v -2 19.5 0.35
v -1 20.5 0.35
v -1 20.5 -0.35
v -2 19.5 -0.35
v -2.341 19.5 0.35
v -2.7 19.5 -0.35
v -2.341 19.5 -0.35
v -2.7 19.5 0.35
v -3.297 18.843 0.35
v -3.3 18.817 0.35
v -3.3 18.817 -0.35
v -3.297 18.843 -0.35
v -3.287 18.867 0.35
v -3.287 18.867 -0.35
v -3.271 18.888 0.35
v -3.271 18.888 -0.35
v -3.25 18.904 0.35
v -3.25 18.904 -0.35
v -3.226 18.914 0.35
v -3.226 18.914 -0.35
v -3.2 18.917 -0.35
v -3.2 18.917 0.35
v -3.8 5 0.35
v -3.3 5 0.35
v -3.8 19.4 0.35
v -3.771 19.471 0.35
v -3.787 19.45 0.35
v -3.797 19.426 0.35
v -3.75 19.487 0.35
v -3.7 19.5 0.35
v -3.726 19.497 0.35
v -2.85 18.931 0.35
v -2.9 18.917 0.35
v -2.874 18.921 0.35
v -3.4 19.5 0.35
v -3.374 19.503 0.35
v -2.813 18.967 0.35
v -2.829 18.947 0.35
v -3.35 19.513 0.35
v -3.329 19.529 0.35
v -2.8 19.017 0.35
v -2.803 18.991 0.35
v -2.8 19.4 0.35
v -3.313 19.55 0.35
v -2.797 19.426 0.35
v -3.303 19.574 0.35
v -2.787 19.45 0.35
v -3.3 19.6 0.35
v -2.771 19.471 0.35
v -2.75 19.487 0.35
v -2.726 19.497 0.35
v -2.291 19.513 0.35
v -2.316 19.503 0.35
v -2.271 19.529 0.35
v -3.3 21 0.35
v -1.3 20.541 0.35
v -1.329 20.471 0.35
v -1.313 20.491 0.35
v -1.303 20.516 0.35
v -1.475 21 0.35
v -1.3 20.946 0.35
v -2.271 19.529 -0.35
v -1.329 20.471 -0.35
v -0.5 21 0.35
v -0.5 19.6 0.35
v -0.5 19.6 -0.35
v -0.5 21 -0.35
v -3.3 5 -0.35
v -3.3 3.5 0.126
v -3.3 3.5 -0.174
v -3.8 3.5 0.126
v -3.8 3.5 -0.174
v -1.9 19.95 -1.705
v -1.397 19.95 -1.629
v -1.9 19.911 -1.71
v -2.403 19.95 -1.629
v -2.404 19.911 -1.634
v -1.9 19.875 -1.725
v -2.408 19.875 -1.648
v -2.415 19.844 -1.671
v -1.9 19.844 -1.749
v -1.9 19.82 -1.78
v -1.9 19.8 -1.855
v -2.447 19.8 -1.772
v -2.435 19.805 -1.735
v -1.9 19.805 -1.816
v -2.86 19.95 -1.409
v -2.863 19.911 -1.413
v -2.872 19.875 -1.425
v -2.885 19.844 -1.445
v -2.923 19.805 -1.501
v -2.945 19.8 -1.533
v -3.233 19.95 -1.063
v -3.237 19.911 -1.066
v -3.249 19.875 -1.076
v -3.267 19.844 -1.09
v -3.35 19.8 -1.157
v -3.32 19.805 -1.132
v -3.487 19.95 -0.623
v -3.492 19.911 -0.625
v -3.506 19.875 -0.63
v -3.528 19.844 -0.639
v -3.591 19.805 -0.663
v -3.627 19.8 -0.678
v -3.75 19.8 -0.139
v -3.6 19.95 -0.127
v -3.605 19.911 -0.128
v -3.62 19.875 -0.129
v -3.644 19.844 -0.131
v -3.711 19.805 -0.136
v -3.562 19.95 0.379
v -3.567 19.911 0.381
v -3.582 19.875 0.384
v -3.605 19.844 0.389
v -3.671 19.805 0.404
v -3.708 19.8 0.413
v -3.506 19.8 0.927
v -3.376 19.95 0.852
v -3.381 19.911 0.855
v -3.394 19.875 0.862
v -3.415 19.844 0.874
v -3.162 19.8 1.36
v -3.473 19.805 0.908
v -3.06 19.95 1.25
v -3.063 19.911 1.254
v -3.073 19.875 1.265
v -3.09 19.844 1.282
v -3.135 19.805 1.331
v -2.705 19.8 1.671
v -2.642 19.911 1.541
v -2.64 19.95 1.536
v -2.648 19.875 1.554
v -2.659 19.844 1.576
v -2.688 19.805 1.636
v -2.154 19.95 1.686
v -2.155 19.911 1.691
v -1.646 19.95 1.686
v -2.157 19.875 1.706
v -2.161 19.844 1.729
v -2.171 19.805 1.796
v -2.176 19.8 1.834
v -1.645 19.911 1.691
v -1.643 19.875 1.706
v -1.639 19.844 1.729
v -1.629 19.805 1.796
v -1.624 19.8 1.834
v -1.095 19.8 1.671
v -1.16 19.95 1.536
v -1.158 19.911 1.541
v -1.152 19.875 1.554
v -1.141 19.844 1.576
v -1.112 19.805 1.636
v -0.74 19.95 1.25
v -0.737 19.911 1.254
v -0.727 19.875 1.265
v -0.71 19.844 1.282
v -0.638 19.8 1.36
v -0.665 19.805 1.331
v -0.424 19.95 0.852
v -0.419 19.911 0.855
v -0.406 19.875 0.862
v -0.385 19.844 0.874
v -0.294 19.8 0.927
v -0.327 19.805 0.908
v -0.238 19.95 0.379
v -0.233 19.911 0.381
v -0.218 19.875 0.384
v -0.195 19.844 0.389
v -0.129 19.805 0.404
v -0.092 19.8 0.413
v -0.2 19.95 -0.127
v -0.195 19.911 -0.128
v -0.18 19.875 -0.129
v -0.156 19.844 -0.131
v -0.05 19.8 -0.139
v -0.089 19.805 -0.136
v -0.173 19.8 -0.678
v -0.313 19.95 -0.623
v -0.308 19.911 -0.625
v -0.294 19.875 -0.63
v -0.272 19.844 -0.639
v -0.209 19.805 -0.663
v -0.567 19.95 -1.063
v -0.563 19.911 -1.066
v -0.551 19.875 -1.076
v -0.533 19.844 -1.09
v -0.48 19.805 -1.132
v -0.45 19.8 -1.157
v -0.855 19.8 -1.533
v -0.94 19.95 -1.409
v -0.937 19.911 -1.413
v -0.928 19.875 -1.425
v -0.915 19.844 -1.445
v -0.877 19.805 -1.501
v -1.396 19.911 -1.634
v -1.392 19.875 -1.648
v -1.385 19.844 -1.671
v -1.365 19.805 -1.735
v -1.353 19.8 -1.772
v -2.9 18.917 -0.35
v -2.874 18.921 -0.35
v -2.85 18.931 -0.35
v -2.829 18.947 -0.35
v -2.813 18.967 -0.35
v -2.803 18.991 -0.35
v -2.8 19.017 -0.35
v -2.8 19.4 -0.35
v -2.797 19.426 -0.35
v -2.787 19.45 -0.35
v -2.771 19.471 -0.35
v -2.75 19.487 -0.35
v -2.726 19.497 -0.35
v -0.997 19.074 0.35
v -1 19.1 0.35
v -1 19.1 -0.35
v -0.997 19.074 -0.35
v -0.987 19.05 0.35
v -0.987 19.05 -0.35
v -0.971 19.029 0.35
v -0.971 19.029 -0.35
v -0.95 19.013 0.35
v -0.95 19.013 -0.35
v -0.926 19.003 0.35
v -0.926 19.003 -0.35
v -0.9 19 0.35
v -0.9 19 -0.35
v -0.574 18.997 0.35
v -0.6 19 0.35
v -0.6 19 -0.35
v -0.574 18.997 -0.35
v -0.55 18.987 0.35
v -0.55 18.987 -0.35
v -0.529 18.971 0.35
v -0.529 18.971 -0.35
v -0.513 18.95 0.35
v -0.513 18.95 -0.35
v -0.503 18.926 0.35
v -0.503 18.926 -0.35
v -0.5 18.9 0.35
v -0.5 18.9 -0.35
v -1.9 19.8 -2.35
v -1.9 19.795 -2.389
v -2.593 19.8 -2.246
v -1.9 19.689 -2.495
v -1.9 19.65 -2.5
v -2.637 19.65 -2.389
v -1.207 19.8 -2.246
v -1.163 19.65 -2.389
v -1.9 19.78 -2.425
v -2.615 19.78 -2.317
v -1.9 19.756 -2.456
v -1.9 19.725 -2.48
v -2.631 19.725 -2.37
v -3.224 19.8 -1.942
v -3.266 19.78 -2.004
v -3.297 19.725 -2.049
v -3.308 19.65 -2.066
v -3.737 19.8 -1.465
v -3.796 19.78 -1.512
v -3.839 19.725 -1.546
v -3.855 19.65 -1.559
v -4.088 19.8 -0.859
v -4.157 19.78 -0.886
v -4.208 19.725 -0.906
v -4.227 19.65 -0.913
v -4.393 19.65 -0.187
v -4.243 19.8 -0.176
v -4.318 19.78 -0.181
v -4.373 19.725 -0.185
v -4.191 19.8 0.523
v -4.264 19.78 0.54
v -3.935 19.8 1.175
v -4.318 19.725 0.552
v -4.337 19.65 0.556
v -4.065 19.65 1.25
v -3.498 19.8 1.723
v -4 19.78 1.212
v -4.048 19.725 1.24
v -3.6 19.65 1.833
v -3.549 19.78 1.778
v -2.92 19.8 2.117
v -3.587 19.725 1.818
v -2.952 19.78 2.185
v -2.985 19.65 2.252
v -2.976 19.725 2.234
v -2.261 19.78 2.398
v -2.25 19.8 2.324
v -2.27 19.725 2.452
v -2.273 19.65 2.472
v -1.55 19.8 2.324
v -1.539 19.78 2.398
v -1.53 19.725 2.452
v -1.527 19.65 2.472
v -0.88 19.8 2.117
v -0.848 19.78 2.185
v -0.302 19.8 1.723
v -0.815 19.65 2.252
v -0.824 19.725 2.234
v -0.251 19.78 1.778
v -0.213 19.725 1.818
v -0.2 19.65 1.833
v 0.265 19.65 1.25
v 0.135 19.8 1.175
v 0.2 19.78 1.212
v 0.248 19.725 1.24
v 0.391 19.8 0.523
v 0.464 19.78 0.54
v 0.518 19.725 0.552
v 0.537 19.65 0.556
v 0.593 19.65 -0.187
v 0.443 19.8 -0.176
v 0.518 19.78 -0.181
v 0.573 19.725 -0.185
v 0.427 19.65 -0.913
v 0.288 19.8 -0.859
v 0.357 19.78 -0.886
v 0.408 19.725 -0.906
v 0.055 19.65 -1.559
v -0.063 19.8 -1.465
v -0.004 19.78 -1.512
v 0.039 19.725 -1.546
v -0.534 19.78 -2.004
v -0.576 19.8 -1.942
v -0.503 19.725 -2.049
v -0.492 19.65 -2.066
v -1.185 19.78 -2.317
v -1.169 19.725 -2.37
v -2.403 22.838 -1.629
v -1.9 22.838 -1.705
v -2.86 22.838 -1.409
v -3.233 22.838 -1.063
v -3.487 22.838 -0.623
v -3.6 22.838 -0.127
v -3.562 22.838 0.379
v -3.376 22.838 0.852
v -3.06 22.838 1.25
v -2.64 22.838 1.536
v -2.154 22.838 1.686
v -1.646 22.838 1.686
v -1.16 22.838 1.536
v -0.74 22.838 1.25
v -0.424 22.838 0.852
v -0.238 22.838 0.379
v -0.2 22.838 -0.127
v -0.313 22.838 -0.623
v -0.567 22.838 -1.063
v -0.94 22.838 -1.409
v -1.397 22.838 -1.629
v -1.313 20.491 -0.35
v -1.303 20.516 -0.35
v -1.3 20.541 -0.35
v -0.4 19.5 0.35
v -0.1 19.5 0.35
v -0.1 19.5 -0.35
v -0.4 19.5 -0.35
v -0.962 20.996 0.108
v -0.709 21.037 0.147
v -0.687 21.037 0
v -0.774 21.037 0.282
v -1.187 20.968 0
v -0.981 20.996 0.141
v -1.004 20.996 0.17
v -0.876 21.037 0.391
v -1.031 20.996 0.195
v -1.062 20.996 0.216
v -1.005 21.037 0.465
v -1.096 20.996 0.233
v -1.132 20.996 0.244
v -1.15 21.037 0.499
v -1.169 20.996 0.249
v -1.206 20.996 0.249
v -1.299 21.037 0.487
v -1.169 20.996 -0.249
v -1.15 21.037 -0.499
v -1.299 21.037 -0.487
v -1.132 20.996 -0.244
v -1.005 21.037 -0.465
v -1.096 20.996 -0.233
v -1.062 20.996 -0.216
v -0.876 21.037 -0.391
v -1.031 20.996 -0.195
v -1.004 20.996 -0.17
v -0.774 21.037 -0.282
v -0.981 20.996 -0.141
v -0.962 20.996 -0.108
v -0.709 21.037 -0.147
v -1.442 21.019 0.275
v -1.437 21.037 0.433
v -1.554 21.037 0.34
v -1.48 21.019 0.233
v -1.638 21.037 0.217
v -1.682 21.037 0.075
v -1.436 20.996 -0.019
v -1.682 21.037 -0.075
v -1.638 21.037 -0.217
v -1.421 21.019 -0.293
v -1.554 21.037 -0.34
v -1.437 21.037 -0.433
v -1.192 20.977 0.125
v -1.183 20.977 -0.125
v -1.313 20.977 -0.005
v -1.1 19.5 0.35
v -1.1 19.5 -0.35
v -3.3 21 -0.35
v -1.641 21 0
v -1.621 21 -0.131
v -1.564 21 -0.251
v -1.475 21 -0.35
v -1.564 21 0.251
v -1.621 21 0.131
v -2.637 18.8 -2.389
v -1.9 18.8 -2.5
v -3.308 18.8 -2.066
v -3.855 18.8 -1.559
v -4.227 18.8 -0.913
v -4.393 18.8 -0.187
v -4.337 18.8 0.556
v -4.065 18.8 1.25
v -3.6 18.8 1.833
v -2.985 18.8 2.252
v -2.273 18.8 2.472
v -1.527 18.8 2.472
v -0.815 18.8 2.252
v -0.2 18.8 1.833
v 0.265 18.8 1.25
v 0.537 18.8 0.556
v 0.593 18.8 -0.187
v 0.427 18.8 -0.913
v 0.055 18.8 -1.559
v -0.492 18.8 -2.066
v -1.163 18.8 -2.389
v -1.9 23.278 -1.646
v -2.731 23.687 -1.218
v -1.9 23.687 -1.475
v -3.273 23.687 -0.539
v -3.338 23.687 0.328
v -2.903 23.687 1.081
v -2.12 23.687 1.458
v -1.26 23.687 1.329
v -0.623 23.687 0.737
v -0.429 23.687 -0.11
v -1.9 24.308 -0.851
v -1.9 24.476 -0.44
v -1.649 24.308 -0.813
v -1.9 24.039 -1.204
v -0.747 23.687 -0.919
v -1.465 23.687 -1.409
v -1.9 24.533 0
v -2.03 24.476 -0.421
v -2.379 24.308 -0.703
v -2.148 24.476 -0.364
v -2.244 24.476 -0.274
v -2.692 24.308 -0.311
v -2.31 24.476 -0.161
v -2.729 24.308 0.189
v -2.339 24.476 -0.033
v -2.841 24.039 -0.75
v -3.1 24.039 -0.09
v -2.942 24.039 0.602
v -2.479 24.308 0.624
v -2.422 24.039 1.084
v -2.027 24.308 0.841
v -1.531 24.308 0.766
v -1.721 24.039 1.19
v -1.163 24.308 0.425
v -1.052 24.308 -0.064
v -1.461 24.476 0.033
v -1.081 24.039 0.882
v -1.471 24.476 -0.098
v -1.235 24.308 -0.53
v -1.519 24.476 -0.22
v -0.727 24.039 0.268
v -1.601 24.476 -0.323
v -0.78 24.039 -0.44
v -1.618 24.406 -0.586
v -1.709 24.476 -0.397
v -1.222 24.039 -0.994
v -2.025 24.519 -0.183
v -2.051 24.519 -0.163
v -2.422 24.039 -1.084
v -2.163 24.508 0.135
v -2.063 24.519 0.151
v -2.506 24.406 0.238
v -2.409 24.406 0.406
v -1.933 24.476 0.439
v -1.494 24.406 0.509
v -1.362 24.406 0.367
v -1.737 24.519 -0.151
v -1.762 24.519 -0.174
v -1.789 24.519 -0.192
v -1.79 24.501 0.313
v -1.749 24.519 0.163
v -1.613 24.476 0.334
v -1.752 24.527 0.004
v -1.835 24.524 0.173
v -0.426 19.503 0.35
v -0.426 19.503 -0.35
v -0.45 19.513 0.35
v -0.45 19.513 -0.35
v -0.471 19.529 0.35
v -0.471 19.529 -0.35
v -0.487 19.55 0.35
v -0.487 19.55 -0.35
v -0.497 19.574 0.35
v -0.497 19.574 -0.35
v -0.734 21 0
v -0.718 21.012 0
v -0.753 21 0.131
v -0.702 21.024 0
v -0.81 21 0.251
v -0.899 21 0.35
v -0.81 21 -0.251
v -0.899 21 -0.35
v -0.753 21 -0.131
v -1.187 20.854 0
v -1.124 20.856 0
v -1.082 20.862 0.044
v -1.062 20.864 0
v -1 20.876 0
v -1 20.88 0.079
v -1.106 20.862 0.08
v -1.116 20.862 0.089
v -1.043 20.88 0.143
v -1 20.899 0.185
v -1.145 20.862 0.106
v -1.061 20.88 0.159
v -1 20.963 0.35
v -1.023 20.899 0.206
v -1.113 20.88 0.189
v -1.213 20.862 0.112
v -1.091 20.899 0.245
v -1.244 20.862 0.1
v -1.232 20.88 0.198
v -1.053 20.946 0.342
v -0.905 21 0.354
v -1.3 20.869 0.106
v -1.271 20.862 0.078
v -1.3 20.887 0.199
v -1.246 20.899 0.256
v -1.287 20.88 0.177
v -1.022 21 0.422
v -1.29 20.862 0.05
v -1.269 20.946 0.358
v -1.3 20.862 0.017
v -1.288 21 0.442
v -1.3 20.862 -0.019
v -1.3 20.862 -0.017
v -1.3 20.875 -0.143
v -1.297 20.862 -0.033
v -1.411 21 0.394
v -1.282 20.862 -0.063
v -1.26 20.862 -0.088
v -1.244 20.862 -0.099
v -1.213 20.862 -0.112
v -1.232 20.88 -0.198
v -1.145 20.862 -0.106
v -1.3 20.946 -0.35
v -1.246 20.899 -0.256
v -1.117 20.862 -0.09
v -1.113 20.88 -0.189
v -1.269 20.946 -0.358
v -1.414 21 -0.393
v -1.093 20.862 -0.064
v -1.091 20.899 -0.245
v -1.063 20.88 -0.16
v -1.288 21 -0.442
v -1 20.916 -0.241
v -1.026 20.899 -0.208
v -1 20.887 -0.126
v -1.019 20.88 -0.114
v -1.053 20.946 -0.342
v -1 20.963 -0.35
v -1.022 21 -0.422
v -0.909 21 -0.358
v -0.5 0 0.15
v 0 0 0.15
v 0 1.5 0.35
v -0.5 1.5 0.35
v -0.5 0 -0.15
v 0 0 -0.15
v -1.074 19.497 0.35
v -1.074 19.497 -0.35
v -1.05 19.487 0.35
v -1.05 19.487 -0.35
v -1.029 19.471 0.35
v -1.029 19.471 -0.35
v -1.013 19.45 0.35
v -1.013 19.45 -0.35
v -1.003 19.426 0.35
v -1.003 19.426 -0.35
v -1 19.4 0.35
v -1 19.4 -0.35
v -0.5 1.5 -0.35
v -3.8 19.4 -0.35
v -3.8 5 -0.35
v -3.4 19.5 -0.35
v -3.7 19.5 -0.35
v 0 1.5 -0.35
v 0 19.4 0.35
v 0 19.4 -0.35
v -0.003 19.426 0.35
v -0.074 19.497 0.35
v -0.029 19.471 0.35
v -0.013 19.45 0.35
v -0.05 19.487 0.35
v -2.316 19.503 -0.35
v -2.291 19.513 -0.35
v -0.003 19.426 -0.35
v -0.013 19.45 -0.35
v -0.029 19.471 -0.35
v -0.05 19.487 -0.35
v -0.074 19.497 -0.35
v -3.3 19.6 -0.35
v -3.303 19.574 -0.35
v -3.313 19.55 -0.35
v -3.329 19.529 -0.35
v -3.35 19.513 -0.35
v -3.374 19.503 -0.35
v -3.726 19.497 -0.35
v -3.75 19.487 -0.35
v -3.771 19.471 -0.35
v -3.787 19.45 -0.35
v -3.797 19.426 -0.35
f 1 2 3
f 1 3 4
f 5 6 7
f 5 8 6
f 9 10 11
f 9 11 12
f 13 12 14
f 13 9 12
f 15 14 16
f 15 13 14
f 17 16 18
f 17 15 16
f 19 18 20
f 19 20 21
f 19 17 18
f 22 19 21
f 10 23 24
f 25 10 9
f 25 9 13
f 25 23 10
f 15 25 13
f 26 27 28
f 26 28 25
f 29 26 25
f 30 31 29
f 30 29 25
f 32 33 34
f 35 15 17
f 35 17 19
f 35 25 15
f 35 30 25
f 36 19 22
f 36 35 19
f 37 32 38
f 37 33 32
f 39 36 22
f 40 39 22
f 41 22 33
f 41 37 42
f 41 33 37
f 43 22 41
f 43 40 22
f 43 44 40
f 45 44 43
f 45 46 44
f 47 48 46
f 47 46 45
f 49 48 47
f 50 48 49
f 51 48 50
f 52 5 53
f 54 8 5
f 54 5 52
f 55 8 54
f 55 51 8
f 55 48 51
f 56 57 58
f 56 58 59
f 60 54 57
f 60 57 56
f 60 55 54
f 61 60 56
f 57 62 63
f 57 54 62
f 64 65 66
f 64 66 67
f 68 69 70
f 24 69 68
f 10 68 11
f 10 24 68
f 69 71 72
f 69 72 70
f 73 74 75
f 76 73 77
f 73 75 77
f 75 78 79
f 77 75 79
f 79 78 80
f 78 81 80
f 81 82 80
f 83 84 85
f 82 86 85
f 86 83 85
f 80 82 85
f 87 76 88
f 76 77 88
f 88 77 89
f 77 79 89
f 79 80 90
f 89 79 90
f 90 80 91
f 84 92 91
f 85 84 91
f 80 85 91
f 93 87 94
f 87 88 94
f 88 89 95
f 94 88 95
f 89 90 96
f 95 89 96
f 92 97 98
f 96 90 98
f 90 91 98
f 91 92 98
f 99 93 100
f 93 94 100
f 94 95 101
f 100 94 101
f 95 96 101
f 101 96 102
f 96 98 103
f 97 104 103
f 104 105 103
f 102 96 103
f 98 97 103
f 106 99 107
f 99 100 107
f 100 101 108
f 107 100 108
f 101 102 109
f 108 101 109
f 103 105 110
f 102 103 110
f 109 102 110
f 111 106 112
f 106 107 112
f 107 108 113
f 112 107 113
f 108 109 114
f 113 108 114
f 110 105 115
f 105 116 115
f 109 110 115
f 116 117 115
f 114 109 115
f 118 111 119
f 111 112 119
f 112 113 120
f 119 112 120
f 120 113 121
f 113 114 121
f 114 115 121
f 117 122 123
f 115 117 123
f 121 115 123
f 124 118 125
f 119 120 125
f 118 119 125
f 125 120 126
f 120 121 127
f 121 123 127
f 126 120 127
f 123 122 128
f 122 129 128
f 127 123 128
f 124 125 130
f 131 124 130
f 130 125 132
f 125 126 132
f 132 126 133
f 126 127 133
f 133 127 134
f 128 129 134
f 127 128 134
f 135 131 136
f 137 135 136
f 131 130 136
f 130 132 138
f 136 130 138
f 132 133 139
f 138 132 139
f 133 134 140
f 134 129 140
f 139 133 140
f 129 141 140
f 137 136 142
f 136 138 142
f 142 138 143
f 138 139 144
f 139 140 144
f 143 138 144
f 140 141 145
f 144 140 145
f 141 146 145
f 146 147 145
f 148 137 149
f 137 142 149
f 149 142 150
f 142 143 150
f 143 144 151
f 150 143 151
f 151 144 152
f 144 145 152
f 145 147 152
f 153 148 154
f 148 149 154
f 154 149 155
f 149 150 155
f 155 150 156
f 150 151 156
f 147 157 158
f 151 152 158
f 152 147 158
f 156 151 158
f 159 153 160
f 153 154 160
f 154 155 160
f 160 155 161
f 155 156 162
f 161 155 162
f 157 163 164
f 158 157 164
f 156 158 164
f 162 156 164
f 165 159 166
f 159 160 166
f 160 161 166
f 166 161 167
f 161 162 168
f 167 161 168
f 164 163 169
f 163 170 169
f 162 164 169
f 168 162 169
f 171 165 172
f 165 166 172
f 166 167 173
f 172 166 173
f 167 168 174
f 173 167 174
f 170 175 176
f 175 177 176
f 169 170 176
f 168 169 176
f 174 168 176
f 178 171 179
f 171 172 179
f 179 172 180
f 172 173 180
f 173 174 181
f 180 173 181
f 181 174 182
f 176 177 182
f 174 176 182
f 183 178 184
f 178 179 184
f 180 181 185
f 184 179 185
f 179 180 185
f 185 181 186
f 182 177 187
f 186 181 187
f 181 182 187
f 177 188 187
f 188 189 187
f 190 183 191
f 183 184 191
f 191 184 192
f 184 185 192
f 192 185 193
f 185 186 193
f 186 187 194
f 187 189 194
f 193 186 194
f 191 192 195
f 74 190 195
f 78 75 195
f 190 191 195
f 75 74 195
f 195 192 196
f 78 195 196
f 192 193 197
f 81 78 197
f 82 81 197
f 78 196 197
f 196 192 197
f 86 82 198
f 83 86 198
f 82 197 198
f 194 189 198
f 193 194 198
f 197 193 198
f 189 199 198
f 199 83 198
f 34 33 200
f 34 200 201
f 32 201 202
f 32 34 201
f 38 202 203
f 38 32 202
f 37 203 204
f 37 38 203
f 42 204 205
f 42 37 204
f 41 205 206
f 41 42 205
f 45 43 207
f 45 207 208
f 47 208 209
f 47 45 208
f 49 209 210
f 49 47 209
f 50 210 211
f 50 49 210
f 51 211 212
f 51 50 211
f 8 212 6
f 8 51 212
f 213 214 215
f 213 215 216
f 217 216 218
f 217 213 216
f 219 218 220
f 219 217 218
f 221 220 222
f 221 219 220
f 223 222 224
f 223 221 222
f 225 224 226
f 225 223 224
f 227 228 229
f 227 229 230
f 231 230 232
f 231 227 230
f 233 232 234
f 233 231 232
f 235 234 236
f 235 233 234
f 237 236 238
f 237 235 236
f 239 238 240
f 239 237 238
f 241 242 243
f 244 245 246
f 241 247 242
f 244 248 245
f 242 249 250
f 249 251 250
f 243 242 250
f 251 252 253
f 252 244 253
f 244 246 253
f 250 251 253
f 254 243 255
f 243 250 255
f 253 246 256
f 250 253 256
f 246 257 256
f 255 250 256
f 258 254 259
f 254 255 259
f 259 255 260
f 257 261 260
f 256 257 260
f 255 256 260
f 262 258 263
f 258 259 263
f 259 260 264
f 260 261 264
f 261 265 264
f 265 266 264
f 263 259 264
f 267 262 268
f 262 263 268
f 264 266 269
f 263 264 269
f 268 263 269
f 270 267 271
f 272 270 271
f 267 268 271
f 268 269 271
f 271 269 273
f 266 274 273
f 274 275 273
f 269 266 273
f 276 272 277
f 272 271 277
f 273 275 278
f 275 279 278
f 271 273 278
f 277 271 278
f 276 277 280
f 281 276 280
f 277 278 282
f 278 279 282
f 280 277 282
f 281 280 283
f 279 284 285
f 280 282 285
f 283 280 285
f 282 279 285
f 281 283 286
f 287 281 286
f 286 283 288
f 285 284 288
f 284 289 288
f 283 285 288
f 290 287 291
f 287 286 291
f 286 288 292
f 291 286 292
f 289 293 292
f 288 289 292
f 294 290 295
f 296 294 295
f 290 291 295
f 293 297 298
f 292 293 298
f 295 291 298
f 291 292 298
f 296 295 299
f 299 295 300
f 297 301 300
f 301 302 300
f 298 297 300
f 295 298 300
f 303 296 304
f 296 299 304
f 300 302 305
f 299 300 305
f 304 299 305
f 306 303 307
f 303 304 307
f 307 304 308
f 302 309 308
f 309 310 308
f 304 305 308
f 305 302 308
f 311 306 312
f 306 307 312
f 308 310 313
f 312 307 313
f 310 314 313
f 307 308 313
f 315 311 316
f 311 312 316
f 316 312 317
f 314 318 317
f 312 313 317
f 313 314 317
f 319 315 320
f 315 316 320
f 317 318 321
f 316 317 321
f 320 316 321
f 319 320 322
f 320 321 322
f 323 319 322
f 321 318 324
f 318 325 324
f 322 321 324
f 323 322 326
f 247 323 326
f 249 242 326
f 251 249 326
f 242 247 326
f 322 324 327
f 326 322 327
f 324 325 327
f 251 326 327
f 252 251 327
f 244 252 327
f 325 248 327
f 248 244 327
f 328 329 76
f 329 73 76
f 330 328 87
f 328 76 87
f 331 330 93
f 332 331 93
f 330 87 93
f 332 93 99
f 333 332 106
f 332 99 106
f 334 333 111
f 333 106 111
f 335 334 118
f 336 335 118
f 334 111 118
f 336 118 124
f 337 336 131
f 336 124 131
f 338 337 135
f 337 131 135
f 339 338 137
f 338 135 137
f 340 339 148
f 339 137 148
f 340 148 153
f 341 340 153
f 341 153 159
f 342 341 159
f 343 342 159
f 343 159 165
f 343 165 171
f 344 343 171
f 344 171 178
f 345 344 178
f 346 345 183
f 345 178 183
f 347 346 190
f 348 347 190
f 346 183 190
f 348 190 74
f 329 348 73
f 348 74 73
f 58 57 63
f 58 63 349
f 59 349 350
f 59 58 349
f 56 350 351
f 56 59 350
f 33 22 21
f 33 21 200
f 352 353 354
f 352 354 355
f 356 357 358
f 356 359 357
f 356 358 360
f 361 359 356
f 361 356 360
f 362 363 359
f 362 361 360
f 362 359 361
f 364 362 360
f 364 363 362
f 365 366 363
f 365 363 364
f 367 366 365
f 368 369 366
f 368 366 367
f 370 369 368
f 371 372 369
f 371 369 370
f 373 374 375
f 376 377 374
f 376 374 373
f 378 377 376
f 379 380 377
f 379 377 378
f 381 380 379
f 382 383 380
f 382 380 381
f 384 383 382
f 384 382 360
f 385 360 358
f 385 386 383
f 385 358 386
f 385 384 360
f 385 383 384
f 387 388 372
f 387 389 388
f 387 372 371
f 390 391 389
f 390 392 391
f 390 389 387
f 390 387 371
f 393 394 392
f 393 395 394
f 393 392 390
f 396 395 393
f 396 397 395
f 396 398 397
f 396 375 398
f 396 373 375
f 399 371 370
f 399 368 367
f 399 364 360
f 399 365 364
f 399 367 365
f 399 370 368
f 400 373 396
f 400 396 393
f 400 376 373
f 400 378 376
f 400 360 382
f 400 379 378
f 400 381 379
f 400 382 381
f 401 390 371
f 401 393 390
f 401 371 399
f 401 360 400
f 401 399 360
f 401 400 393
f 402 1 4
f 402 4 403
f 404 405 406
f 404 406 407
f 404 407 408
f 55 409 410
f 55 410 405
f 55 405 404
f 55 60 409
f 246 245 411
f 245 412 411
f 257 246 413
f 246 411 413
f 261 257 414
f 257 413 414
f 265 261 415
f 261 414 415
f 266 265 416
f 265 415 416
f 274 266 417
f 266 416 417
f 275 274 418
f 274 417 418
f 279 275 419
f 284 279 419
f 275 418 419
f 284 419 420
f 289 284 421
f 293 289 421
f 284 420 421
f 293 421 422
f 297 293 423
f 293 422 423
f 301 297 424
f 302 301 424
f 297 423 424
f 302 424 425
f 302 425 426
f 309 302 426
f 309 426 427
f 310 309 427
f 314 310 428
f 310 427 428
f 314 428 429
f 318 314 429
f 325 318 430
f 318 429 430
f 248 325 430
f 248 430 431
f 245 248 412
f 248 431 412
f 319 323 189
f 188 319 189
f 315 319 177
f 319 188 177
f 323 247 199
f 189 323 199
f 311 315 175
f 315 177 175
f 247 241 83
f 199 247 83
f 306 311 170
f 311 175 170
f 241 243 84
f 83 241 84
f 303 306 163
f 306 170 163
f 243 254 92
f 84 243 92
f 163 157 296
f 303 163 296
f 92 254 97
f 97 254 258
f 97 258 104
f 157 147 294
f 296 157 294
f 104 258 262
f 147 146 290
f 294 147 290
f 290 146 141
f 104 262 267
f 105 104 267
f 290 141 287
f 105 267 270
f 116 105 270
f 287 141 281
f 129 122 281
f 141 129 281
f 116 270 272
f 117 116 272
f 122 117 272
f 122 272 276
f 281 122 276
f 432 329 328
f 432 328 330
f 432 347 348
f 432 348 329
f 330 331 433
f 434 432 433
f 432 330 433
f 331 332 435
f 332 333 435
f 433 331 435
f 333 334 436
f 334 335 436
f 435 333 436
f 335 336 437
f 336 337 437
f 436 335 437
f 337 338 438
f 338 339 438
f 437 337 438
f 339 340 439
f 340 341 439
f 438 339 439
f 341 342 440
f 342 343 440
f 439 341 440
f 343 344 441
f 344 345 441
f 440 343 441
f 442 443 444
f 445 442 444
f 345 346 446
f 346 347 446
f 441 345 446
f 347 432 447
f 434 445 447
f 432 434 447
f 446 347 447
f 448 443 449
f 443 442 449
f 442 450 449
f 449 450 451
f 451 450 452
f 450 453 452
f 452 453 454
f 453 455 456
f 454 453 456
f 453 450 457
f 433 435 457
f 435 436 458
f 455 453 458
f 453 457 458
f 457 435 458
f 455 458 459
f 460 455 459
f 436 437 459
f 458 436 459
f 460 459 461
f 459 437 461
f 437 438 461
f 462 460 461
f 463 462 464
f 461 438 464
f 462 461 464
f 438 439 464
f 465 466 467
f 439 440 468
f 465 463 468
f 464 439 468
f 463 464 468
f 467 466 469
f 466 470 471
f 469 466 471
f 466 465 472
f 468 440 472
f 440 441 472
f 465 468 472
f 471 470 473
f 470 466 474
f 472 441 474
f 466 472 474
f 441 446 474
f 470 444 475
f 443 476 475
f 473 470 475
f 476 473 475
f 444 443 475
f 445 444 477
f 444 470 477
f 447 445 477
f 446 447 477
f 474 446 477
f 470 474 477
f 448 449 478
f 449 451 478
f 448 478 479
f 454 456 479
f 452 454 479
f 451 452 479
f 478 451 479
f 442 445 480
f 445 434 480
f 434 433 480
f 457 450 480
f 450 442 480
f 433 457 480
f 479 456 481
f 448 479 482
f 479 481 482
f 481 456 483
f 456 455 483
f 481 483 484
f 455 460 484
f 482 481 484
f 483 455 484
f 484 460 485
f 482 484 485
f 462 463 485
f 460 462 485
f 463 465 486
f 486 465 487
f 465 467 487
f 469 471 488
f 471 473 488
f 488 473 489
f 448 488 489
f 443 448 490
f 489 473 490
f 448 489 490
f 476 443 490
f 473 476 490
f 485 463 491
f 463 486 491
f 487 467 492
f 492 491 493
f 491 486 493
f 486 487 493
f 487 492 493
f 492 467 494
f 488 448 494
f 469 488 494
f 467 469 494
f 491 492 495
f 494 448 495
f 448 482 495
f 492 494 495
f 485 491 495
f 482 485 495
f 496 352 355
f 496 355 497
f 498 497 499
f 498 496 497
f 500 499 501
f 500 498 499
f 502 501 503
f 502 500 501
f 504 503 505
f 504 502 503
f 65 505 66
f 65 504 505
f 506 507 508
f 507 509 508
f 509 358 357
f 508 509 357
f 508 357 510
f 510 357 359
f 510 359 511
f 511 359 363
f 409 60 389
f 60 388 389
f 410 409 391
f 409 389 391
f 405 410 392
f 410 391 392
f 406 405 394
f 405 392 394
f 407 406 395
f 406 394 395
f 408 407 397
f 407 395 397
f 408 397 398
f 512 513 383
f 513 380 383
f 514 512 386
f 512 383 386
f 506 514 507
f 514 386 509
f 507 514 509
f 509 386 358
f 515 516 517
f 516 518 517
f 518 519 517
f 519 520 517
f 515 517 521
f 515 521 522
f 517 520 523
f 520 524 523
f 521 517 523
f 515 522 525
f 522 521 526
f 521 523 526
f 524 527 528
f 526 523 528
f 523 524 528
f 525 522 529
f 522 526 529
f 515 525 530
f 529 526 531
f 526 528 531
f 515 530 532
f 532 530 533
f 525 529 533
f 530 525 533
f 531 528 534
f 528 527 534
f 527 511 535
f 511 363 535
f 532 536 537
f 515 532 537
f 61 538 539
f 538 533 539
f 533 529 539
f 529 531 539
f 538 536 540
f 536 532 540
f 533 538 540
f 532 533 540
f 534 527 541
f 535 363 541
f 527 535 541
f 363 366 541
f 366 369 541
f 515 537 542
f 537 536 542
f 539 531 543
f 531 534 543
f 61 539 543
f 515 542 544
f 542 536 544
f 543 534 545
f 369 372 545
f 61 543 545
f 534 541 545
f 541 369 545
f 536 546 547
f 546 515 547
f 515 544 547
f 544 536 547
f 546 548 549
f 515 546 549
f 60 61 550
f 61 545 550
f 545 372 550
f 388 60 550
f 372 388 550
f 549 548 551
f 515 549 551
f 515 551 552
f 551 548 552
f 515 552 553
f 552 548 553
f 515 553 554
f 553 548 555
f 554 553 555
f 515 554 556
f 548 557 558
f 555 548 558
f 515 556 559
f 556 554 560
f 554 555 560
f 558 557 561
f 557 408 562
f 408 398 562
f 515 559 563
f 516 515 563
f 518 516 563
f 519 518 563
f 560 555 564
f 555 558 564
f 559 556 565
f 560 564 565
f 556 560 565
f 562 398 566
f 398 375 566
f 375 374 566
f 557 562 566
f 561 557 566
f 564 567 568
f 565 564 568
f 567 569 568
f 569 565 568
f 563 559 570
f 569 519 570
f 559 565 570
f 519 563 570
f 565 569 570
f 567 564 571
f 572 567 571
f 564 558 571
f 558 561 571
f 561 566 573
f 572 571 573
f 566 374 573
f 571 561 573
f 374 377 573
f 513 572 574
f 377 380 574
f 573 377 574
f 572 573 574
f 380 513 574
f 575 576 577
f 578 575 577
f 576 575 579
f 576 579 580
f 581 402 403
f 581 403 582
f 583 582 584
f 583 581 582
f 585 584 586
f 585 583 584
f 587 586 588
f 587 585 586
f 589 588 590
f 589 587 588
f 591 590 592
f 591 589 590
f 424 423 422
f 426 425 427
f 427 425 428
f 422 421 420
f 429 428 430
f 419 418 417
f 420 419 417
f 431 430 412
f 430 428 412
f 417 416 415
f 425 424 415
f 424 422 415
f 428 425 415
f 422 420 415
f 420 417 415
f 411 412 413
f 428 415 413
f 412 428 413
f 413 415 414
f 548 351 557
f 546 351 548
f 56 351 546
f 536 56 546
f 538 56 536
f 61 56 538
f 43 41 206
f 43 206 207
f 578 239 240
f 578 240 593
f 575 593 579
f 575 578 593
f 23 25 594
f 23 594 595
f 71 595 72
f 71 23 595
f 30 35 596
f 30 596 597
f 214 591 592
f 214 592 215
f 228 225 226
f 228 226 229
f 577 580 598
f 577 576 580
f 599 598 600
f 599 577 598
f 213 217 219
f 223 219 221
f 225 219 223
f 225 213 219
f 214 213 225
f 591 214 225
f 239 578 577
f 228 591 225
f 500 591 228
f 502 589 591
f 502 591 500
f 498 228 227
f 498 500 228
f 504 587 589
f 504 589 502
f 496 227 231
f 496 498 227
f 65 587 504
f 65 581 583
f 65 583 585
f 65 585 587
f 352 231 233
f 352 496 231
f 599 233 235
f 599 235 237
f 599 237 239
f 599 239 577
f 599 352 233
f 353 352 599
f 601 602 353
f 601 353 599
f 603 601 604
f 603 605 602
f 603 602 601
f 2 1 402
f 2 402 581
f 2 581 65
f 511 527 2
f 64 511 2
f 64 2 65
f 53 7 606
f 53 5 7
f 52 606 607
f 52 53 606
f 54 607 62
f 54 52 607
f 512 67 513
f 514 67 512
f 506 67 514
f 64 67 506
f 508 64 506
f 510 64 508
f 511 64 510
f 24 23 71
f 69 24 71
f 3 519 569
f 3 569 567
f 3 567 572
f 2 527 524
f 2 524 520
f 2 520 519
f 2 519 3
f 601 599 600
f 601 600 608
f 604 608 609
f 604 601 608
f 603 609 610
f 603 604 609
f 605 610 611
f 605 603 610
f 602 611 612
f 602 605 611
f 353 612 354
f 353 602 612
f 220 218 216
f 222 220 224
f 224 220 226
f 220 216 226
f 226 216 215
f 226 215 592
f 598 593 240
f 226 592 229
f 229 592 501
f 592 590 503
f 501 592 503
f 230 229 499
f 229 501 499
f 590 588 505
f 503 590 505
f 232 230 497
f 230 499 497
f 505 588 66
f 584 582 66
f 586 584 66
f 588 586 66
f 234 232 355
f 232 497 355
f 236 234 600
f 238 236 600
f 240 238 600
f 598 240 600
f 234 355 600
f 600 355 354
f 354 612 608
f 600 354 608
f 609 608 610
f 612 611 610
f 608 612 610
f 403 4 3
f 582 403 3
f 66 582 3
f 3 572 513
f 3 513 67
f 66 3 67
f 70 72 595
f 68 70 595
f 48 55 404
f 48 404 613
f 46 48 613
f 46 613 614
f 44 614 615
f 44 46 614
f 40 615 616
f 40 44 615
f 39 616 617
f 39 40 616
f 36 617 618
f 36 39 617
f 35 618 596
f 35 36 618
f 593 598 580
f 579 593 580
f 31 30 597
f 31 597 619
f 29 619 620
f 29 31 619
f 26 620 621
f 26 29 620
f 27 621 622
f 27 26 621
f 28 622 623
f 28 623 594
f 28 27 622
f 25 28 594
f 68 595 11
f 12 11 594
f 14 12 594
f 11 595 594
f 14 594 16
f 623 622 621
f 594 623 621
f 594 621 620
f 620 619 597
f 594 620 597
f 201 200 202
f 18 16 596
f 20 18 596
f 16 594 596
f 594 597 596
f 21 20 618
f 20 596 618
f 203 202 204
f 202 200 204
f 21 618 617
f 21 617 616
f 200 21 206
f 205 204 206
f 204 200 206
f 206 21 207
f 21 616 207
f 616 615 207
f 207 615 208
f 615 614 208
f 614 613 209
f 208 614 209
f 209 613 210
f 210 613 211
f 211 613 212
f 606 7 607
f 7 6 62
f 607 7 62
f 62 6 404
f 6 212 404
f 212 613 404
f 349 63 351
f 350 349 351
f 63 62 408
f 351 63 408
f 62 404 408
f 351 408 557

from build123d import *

# Parameters (mm, degrees)
BOSS_EXTRUDE1_DEPTH = 0.35
BOSS_EXTRUDE2_DEPTH = 0.35
CUT_EXTRUDE1_DEPTH  = 0.7
CUT_EXTRUDE2_DEPTH  = 0.7


with BuildPart() as part:
    # Sketch1 → Boss-Extrude1 (new, symmetric)
    with BuildSketch(Plane.XY):
        with BuildLine():
            Line((0, 0), (0, 19.4))
            ThreePointArc((0, 19.4), (-0.029289322, 19.470710678), (-0.1, 19.5))
            Line((-0.1, 19.5), (-0.4, 19.5))
            ThreePointArc((-0.4, 19.5), (-0.470710678, 19.529289322), (-0.5, 19.6))
            Line((-0.5, 19.6), (-0.5, 20.5))
            Line((-0.5, 20.5), (-0.5, 21))
            Line((-0.5, 21), (-1, 21))
            Line((-1, 21), (-1, 20.5))
            Line((-1, 20.5), (-2, 19.5))
            Line((-2, 19.5), (-1.1, 19.5))
            ThreePointArc((-1.1, 19.5), (-1.029289322, 19.470710678), (-1, 19.4))
            Line((-1, 19.4), (-1, 19.1))
            ThreePointArc((-1, 19.1), (-0.970710678, 19.029289322), (-0.9, 19))
            Line((-0.9, 19), (-0.6, 19))
            ThreePointArc((-0.6, 19), (-0.529289322, 18.970710678), (-0.5, 18.9))
            Line((-0.5, 18.9), (-0.5, 0))
            Line((-0.5, 0), (0, 0))
        make_face()
    extrude(amount=BOSS_EXTRUDE1_DEPTH, both=True)


with BuildPart() as body_2:
    # Sketch2 → Boss-Extrude2 (new, symmetric)
    with BuildSketch(Plane.XY):
        with BuildLine():
            Line((-2.270710678, 19.529289322), (-1.329289322, 20.470710678))
            ThreePointArc((-1.329289322, 20.470710678), (-1.307612047, 20.503153013), (-1.3, 20.541421356))
            Line((-1.3, 20.541421356), (-1.3, 21))
            Line((-1.3, 21), (-3.3, 21))
            Line((-3.3, 21), (-3.3, 19.6))
            ThreePointArc((-3.3, 19.6), (-3.329289322, 19.529289322), (-3.4, 19.5))
            Line((-3.4, 19.5), (-3.7, 19.5))
            ThreePointArc((-3.7, 19.5), (-3.770710678, 19.470710678), (-3.8, 19.4))
            Line((-3.8, 19.4), (-3.8, 3.5))
            Line((-3.8, 3.5), (-3.3, 3.5))
            Line((-3.3, 3.5), (-3.3, 18.817329295))
            ThreePointArc((-3.3, 18.817329295), (-3.270710678, 18.888039973), (-3.2, 18.917329295))
            Line((-3.2, 18.917329295), (-2.9, 18.917329295))
            ThreePointArc((-2.9, 18.917329295), (-2.829289322, 18.946618617), (-2.8, 19.017329295))
            Line((-2.8, 19.017329295), (-2.8, 19.4))
            ThreePointArc((-2.8, 19.4), (-2.770710678, 19.470710678), (-2.7, 19.5))
            Line((-2.7, 19.5), (-2.341421356, 19.5))
            ThreePointArc((-2.341421356, 19.5), (-2.303153013, 19.507612047), (-2.270710678, 19.529289322))
        make_face()
    extrude(amount=BOSS_EXTRUDE2_DEPTH, both=True)


with BuildPart() as cut_revolve2_tool:
    # Sketch3 → Cut-Revolve2 (revolve)
    with BuildSketch(Plane.XY):
        with BuildLine():
            Line((-1.187247292, 20.854394701), (-1.187247292, 21.16036165))
            Line((-1.187247292, 21.16036165), (-0.687247292, 21.037131329))
            ThreePointArc((-0.687247292, 21.037131329), (-0.920585717, 20.900173974), (-1.187247292, 20.854394701))
        make_face()
    revolve(axis=Axis((-1.187247292, 20.854394701, 0), (0, 1, 0)))


with BuildPart() as part_1:
    add(part.part)

    # Cut-Revolve2: cut by cut_revolve2_tool
    add(cut_revolve2_tool.part, mode=Mode.SUBTRACT)



with BuildPart() as body_2_1:
    add(body_2.part)

    # Cut-Revolve2: cut by cut_revolve2_tool
    add(cut_revolve2_tool.part, mode=Mode.SUBTRACT)


with BuildPart() as part_2:
    add(part_1.part)

    add(body_2_1.part)  # Revolve2 merges body 2
    # Sketch5 → Revolve2 (revolve)
    with BuildSketch(Plane.XY):
        with BuildLine():
            Line((-1.187247292, 20.967936142), (-1.187247292, 20.854394701))
            ThreePointArc((-1.187247292, 20.854394701), (-0.920585717, 20.900173974), (-0.687247292, 21.037131329))
            add(Edge.make_bspline(
                [(-1.187247292, 20.967936142), (-1.018996559, 20.969146878), (-0.855677822, 21.018217253), (-0.687247292, 21.037131329)],
                knots=[0, 0, 0, 0, 1, 1, 1, 1], degree=3))
        make_face()
    revolve(axis=Axis((-1.187247292, 20.967936142, 0), (0, -1, 0)))

    # Sketch8 → Cut-Extrude1 (cut)
    with BuildSketch(Plane(origin=(0, 0, 0), x_dir=(0, 0, -1), z_dir=(1, 0, 0))):
        Polygon((0.35, 1.5), (0.15, 0), (0.35, 0), align=None)
        Polygon((-0.35, 0), (-0.15, 0), (-0.35, 1.5), align=None)
    extrude(amount=-CUT_EXTRUDE1_DEPTH, mode=Mode.SUBTRACT)

    # Sketch9 → Cut-Extrude2 (cut)
    with BuildSketch(Plane.ZY.offset(3.8)):
        Polygon((-0.35, 3.5), (-0.173947539, 3.5), (-0.35, 5), align=None)
        Polygon((0.35, 5), (0.126052461, 3.5), (0.35, 3.5), align=None)
    extrude(amount=-CUT_EXTRUDE2_DEPTH, mode=Mode.SUBTRACT)


with BuildPart() as body_2_2:
    # Sketch7 → Revolve6 (revolve)
    with BuildSketch(Plane.XY, mode=Mode.PRIVATE) as revolve6_sk:
        with BuildLine():
            Line((-0.195111941, 22.838026568), (-0.195111941, 19.95))
            ThreePointArc((-0.195111941, 19.95), (-0.151177958, 19.843933983), (-0.045111941, 19.8))
            Line((-0.045111941, 19.8), (0.45, 19.8))
            ThreePointArc((0.45, 19.8), (0.556066017, 19.756066017), (0.6, 19.65))
            Line((0.6, 19.65), (0.6, 18.8))
            Line((0.6, 18.8), (-1.9, 18.8))
            Line((-1.9, 18.8), (-1.9, 24.533124413))
            ThreePointArc((-1.9, 24.533124413), (-0.696489712, 24.038669369), (-0.195111941, 22.838026568))
        make_face()
    revolve(revolve6_sk.sketch.rotate(Axis((-1.9, 18.8, 0), (0, 1, 0)), 90), axis=Axis((-1.9, 18.8, 0), (0, 1, 0)))


solid = Compound([part_2.part, body_2_2.part])
